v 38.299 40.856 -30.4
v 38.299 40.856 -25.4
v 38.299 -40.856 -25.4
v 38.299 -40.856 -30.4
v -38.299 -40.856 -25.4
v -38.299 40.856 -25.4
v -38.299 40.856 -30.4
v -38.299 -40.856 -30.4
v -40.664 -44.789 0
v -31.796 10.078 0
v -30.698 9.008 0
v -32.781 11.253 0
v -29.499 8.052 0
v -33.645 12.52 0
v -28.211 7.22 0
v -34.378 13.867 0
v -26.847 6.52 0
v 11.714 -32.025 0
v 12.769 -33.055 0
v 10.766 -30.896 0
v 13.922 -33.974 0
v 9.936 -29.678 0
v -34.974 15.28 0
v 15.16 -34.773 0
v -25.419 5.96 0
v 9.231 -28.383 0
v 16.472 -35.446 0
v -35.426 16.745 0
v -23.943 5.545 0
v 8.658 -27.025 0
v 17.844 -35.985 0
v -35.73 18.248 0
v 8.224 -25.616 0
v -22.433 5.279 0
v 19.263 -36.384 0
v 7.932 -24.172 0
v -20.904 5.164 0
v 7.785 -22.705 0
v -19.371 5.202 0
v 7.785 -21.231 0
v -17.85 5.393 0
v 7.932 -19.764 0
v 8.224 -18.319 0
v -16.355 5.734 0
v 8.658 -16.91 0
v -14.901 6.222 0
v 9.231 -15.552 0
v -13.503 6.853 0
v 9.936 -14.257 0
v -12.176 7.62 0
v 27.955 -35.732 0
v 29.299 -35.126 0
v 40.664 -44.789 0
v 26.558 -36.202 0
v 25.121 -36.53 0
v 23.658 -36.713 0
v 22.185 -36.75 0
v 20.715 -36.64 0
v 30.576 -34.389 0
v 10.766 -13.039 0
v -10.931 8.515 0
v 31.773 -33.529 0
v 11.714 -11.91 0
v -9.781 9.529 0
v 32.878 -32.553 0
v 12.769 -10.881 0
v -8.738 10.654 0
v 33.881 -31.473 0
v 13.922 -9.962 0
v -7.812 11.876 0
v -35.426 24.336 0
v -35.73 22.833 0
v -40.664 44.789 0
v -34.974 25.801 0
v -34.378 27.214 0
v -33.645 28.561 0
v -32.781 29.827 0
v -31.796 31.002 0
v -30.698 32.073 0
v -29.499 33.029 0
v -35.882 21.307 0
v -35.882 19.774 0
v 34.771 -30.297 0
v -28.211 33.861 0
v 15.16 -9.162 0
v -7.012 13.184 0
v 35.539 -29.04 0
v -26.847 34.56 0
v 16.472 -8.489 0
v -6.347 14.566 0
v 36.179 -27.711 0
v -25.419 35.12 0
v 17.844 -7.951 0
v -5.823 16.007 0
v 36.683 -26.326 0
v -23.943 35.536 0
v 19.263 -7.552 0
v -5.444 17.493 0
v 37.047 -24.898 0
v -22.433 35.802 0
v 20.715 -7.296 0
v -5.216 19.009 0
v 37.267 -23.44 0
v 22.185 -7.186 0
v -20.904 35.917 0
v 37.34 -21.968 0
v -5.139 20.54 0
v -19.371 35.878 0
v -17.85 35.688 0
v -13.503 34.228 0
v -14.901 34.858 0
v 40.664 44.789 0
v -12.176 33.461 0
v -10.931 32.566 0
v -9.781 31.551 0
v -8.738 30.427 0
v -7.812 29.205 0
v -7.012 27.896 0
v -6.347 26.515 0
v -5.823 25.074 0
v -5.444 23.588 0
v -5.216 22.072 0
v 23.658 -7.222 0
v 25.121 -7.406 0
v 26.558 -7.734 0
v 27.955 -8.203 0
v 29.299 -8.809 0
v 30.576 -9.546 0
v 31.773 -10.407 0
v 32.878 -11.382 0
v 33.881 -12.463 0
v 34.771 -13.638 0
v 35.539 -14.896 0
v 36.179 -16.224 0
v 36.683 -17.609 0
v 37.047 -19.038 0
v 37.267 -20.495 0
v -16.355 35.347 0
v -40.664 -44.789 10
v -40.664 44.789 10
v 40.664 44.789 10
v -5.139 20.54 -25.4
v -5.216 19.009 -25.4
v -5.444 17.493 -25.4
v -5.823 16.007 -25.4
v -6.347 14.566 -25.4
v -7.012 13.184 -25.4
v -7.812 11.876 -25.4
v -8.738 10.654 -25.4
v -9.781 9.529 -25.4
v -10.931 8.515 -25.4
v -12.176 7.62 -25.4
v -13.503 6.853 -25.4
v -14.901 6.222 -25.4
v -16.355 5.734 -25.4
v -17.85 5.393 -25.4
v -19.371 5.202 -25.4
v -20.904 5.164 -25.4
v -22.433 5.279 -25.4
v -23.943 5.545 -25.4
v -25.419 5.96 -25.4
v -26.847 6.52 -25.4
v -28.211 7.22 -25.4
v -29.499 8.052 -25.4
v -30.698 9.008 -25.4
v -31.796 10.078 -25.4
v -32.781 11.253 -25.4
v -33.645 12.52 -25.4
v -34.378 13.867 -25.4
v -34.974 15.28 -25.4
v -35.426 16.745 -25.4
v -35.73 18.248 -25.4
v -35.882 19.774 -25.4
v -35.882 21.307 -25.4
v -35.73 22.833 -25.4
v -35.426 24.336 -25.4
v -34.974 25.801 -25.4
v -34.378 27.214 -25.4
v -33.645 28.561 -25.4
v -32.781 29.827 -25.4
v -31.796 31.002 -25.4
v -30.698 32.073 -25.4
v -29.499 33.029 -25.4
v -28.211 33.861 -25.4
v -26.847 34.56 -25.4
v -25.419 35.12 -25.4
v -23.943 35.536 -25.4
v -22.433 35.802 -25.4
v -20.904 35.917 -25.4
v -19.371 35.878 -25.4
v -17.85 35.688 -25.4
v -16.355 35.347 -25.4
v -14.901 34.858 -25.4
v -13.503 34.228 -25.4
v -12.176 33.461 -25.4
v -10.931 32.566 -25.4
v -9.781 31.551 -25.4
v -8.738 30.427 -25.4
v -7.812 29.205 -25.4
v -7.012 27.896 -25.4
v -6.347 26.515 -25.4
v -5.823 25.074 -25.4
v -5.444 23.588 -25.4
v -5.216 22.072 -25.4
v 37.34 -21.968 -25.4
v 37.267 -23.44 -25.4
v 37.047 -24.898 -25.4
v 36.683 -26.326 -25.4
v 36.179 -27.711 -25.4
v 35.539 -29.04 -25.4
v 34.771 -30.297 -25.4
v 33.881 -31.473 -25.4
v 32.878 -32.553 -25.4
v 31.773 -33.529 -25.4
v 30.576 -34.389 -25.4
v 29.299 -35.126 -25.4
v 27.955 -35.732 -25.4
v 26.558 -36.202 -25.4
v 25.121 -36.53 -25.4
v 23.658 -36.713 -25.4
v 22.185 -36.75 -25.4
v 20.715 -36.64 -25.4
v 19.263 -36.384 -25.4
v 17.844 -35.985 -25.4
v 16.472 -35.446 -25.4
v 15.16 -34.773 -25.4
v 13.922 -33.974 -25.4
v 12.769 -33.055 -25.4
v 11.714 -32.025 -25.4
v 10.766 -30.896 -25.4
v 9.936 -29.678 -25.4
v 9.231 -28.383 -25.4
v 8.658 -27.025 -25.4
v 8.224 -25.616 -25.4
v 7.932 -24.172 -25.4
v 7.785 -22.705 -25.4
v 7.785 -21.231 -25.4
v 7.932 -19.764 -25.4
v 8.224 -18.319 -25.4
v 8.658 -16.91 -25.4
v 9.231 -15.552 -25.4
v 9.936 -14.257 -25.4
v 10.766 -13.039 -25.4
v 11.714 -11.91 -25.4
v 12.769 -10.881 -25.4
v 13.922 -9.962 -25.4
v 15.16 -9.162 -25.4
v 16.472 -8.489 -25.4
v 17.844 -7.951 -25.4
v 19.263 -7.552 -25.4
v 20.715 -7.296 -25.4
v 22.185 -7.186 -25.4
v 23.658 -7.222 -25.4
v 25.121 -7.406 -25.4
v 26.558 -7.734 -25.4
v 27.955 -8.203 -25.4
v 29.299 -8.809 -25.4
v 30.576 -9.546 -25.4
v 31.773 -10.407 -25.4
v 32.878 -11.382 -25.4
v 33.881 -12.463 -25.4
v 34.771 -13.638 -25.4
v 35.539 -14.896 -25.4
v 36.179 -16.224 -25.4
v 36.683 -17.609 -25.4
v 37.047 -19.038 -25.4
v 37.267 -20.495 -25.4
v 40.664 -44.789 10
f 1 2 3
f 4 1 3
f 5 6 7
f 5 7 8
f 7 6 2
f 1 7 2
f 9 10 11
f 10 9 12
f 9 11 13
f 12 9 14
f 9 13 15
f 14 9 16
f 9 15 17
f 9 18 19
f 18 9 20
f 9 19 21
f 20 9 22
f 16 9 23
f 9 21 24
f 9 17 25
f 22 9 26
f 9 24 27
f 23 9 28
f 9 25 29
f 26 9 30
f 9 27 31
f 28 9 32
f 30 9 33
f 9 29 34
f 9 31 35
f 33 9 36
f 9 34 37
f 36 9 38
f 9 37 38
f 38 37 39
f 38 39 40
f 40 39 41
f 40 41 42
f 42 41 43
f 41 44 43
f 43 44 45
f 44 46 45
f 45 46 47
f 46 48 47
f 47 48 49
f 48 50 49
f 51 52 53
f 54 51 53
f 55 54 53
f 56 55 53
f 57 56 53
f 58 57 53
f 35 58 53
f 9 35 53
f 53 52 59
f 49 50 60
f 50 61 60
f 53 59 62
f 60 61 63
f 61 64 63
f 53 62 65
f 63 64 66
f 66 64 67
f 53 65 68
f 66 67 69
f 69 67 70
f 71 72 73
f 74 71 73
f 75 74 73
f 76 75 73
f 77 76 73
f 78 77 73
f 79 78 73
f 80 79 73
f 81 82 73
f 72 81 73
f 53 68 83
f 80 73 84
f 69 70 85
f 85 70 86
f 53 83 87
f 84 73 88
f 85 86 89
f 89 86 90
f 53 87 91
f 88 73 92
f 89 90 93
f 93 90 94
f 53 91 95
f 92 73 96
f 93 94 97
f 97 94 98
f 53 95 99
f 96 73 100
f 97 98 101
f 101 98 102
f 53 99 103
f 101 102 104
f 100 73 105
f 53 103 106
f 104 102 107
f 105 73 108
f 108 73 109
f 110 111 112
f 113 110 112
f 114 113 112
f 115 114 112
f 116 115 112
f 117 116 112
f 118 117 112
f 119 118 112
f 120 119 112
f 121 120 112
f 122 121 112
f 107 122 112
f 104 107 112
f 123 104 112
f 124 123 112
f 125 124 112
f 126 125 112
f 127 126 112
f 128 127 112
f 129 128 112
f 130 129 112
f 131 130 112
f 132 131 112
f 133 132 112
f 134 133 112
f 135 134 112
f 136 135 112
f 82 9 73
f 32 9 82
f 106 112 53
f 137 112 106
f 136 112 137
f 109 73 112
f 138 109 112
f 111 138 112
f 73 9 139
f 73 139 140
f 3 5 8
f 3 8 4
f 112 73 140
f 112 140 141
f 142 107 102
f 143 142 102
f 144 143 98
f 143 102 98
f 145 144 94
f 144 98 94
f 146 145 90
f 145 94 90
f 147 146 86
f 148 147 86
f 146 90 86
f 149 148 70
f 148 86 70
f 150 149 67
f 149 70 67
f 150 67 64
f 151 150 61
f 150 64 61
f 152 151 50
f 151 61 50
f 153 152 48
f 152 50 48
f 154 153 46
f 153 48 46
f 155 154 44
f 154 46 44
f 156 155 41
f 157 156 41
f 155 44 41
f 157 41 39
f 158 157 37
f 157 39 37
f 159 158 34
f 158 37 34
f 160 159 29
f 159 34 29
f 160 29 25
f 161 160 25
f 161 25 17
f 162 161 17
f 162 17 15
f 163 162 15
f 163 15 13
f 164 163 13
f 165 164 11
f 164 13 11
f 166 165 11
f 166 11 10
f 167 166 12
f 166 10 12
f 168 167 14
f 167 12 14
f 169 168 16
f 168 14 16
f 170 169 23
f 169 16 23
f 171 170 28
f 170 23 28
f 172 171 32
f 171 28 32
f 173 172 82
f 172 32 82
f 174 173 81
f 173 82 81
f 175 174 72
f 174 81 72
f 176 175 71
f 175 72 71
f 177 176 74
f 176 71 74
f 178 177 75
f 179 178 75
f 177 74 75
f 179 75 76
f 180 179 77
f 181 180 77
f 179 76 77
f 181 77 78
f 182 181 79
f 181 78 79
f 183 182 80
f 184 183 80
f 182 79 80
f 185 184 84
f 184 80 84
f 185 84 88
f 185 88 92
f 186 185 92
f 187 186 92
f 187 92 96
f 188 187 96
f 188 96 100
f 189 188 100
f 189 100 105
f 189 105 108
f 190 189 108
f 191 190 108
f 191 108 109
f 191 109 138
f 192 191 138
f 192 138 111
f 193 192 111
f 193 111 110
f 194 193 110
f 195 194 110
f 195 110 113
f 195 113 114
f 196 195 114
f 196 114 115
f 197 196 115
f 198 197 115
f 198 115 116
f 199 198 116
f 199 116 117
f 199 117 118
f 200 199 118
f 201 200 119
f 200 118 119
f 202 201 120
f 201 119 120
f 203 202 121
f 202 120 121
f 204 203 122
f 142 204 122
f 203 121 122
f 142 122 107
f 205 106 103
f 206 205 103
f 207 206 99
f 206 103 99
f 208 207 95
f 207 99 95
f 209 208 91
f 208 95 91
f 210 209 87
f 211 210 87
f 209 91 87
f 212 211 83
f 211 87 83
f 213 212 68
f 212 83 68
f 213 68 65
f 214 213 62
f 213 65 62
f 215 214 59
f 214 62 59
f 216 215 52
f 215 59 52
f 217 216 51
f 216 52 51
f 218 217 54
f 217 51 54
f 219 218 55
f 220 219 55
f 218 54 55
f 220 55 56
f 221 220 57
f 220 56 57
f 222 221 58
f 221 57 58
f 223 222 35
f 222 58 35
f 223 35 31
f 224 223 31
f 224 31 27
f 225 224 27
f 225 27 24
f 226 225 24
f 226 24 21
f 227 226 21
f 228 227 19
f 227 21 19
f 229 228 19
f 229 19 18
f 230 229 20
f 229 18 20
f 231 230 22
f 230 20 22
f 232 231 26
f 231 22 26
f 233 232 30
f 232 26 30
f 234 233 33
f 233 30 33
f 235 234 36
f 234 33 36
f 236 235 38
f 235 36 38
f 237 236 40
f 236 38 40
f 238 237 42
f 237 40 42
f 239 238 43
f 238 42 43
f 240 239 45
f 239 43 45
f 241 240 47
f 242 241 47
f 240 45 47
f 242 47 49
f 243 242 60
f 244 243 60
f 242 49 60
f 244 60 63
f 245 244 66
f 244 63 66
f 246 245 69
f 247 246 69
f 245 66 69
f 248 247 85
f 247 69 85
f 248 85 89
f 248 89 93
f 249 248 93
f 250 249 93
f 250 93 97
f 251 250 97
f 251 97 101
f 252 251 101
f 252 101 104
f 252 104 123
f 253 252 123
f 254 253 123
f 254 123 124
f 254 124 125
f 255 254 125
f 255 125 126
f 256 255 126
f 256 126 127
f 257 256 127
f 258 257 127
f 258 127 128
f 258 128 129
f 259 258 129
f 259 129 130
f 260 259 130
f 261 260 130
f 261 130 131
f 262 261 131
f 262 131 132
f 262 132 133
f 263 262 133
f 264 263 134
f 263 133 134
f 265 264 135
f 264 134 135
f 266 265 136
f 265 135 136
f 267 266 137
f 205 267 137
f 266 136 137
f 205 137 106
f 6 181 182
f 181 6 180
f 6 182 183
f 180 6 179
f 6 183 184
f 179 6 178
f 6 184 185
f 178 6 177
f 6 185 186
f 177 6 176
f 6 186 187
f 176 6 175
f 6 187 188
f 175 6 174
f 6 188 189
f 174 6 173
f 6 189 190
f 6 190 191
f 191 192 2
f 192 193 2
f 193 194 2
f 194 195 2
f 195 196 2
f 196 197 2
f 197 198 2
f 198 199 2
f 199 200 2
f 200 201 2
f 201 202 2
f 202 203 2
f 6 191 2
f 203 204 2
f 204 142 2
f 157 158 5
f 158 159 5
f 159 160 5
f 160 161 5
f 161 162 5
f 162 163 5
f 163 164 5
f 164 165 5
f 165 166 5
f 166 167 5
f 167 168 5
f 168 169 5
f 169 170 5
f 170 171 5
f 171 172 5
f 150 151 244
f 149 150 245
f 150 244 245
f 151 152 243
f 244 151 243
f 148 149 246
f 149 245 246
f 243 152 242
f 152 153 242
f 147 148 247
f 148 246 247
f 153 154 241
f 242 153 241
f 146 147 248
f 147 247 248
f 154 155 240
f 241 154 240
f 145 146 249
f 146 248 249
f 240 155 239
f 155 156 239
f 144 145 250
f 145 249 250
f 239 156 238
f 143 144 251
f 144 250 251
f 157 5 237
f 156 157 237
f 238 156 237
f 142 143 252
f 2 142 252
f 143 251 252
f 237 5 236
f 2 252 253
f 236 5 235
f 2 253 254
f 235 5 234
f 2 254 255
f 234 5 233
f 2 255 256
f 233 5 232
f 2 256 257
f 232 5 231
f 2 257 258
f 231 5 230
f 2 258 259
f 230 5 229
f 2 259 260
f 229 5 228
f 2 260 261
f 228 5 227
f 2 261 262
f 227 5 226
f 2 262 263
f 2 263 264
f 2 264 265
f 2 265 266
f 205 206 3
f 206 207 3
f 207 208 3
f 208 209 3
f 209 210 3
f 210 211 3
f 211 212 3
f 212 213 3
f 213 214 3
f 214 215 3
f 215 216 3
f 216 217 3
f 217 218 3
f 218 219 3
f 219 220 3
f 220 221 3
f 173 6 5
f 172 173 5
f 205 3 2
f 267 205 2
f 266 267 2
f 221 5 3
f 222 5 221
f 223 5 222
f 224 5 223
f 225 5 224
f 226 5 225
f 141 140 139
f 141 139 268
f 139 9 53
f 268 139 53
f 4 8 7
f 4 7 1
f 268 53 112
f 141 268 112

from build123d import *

# Parameters (mm, degrees)
F0_W     = 81.327438
F0_H     = 89.578062
F1_DEPTH = 10
F2_R     = 15.381111
F2_R_2   = 14.786786
F3_DEPTH = 25.4
F4_W     = 76.597116
F4_H     = 81.712402
F5_DEPTH = 5


with BuildPart() as f1:
    # F0 (on Top) → F1 (new body)
    with BuildSketch(Plane.XY):
        Rectangle(F0_W, F0_H)
    extrude(amount=F1_DEPTH)

    # F2 (on face) → F3 (join)
    with BuildSketch(Plane(origin=(0, 0, 0), x_dir=(1, 0, 0), z_dir=(0, 0, -1))):
        with Locations((-20.520471, -20.540299)):
            Circle(F2_R)
        with Locations((22.55322, 21.967739)):
            Circle(F2_R_2)
    extrude(amount=F3_DEPTH)

    # F4 (on face) → F5 (join)
    with BuildSketch(Plane(origin=(0, 0, -25.4), x_dir=(1, 0, 0), z_dir=(0, 0, -1))):
        Rectangle(F4_W, F4_H)
    extrude(amount=F5_DEPTH)


solid = f1.part
